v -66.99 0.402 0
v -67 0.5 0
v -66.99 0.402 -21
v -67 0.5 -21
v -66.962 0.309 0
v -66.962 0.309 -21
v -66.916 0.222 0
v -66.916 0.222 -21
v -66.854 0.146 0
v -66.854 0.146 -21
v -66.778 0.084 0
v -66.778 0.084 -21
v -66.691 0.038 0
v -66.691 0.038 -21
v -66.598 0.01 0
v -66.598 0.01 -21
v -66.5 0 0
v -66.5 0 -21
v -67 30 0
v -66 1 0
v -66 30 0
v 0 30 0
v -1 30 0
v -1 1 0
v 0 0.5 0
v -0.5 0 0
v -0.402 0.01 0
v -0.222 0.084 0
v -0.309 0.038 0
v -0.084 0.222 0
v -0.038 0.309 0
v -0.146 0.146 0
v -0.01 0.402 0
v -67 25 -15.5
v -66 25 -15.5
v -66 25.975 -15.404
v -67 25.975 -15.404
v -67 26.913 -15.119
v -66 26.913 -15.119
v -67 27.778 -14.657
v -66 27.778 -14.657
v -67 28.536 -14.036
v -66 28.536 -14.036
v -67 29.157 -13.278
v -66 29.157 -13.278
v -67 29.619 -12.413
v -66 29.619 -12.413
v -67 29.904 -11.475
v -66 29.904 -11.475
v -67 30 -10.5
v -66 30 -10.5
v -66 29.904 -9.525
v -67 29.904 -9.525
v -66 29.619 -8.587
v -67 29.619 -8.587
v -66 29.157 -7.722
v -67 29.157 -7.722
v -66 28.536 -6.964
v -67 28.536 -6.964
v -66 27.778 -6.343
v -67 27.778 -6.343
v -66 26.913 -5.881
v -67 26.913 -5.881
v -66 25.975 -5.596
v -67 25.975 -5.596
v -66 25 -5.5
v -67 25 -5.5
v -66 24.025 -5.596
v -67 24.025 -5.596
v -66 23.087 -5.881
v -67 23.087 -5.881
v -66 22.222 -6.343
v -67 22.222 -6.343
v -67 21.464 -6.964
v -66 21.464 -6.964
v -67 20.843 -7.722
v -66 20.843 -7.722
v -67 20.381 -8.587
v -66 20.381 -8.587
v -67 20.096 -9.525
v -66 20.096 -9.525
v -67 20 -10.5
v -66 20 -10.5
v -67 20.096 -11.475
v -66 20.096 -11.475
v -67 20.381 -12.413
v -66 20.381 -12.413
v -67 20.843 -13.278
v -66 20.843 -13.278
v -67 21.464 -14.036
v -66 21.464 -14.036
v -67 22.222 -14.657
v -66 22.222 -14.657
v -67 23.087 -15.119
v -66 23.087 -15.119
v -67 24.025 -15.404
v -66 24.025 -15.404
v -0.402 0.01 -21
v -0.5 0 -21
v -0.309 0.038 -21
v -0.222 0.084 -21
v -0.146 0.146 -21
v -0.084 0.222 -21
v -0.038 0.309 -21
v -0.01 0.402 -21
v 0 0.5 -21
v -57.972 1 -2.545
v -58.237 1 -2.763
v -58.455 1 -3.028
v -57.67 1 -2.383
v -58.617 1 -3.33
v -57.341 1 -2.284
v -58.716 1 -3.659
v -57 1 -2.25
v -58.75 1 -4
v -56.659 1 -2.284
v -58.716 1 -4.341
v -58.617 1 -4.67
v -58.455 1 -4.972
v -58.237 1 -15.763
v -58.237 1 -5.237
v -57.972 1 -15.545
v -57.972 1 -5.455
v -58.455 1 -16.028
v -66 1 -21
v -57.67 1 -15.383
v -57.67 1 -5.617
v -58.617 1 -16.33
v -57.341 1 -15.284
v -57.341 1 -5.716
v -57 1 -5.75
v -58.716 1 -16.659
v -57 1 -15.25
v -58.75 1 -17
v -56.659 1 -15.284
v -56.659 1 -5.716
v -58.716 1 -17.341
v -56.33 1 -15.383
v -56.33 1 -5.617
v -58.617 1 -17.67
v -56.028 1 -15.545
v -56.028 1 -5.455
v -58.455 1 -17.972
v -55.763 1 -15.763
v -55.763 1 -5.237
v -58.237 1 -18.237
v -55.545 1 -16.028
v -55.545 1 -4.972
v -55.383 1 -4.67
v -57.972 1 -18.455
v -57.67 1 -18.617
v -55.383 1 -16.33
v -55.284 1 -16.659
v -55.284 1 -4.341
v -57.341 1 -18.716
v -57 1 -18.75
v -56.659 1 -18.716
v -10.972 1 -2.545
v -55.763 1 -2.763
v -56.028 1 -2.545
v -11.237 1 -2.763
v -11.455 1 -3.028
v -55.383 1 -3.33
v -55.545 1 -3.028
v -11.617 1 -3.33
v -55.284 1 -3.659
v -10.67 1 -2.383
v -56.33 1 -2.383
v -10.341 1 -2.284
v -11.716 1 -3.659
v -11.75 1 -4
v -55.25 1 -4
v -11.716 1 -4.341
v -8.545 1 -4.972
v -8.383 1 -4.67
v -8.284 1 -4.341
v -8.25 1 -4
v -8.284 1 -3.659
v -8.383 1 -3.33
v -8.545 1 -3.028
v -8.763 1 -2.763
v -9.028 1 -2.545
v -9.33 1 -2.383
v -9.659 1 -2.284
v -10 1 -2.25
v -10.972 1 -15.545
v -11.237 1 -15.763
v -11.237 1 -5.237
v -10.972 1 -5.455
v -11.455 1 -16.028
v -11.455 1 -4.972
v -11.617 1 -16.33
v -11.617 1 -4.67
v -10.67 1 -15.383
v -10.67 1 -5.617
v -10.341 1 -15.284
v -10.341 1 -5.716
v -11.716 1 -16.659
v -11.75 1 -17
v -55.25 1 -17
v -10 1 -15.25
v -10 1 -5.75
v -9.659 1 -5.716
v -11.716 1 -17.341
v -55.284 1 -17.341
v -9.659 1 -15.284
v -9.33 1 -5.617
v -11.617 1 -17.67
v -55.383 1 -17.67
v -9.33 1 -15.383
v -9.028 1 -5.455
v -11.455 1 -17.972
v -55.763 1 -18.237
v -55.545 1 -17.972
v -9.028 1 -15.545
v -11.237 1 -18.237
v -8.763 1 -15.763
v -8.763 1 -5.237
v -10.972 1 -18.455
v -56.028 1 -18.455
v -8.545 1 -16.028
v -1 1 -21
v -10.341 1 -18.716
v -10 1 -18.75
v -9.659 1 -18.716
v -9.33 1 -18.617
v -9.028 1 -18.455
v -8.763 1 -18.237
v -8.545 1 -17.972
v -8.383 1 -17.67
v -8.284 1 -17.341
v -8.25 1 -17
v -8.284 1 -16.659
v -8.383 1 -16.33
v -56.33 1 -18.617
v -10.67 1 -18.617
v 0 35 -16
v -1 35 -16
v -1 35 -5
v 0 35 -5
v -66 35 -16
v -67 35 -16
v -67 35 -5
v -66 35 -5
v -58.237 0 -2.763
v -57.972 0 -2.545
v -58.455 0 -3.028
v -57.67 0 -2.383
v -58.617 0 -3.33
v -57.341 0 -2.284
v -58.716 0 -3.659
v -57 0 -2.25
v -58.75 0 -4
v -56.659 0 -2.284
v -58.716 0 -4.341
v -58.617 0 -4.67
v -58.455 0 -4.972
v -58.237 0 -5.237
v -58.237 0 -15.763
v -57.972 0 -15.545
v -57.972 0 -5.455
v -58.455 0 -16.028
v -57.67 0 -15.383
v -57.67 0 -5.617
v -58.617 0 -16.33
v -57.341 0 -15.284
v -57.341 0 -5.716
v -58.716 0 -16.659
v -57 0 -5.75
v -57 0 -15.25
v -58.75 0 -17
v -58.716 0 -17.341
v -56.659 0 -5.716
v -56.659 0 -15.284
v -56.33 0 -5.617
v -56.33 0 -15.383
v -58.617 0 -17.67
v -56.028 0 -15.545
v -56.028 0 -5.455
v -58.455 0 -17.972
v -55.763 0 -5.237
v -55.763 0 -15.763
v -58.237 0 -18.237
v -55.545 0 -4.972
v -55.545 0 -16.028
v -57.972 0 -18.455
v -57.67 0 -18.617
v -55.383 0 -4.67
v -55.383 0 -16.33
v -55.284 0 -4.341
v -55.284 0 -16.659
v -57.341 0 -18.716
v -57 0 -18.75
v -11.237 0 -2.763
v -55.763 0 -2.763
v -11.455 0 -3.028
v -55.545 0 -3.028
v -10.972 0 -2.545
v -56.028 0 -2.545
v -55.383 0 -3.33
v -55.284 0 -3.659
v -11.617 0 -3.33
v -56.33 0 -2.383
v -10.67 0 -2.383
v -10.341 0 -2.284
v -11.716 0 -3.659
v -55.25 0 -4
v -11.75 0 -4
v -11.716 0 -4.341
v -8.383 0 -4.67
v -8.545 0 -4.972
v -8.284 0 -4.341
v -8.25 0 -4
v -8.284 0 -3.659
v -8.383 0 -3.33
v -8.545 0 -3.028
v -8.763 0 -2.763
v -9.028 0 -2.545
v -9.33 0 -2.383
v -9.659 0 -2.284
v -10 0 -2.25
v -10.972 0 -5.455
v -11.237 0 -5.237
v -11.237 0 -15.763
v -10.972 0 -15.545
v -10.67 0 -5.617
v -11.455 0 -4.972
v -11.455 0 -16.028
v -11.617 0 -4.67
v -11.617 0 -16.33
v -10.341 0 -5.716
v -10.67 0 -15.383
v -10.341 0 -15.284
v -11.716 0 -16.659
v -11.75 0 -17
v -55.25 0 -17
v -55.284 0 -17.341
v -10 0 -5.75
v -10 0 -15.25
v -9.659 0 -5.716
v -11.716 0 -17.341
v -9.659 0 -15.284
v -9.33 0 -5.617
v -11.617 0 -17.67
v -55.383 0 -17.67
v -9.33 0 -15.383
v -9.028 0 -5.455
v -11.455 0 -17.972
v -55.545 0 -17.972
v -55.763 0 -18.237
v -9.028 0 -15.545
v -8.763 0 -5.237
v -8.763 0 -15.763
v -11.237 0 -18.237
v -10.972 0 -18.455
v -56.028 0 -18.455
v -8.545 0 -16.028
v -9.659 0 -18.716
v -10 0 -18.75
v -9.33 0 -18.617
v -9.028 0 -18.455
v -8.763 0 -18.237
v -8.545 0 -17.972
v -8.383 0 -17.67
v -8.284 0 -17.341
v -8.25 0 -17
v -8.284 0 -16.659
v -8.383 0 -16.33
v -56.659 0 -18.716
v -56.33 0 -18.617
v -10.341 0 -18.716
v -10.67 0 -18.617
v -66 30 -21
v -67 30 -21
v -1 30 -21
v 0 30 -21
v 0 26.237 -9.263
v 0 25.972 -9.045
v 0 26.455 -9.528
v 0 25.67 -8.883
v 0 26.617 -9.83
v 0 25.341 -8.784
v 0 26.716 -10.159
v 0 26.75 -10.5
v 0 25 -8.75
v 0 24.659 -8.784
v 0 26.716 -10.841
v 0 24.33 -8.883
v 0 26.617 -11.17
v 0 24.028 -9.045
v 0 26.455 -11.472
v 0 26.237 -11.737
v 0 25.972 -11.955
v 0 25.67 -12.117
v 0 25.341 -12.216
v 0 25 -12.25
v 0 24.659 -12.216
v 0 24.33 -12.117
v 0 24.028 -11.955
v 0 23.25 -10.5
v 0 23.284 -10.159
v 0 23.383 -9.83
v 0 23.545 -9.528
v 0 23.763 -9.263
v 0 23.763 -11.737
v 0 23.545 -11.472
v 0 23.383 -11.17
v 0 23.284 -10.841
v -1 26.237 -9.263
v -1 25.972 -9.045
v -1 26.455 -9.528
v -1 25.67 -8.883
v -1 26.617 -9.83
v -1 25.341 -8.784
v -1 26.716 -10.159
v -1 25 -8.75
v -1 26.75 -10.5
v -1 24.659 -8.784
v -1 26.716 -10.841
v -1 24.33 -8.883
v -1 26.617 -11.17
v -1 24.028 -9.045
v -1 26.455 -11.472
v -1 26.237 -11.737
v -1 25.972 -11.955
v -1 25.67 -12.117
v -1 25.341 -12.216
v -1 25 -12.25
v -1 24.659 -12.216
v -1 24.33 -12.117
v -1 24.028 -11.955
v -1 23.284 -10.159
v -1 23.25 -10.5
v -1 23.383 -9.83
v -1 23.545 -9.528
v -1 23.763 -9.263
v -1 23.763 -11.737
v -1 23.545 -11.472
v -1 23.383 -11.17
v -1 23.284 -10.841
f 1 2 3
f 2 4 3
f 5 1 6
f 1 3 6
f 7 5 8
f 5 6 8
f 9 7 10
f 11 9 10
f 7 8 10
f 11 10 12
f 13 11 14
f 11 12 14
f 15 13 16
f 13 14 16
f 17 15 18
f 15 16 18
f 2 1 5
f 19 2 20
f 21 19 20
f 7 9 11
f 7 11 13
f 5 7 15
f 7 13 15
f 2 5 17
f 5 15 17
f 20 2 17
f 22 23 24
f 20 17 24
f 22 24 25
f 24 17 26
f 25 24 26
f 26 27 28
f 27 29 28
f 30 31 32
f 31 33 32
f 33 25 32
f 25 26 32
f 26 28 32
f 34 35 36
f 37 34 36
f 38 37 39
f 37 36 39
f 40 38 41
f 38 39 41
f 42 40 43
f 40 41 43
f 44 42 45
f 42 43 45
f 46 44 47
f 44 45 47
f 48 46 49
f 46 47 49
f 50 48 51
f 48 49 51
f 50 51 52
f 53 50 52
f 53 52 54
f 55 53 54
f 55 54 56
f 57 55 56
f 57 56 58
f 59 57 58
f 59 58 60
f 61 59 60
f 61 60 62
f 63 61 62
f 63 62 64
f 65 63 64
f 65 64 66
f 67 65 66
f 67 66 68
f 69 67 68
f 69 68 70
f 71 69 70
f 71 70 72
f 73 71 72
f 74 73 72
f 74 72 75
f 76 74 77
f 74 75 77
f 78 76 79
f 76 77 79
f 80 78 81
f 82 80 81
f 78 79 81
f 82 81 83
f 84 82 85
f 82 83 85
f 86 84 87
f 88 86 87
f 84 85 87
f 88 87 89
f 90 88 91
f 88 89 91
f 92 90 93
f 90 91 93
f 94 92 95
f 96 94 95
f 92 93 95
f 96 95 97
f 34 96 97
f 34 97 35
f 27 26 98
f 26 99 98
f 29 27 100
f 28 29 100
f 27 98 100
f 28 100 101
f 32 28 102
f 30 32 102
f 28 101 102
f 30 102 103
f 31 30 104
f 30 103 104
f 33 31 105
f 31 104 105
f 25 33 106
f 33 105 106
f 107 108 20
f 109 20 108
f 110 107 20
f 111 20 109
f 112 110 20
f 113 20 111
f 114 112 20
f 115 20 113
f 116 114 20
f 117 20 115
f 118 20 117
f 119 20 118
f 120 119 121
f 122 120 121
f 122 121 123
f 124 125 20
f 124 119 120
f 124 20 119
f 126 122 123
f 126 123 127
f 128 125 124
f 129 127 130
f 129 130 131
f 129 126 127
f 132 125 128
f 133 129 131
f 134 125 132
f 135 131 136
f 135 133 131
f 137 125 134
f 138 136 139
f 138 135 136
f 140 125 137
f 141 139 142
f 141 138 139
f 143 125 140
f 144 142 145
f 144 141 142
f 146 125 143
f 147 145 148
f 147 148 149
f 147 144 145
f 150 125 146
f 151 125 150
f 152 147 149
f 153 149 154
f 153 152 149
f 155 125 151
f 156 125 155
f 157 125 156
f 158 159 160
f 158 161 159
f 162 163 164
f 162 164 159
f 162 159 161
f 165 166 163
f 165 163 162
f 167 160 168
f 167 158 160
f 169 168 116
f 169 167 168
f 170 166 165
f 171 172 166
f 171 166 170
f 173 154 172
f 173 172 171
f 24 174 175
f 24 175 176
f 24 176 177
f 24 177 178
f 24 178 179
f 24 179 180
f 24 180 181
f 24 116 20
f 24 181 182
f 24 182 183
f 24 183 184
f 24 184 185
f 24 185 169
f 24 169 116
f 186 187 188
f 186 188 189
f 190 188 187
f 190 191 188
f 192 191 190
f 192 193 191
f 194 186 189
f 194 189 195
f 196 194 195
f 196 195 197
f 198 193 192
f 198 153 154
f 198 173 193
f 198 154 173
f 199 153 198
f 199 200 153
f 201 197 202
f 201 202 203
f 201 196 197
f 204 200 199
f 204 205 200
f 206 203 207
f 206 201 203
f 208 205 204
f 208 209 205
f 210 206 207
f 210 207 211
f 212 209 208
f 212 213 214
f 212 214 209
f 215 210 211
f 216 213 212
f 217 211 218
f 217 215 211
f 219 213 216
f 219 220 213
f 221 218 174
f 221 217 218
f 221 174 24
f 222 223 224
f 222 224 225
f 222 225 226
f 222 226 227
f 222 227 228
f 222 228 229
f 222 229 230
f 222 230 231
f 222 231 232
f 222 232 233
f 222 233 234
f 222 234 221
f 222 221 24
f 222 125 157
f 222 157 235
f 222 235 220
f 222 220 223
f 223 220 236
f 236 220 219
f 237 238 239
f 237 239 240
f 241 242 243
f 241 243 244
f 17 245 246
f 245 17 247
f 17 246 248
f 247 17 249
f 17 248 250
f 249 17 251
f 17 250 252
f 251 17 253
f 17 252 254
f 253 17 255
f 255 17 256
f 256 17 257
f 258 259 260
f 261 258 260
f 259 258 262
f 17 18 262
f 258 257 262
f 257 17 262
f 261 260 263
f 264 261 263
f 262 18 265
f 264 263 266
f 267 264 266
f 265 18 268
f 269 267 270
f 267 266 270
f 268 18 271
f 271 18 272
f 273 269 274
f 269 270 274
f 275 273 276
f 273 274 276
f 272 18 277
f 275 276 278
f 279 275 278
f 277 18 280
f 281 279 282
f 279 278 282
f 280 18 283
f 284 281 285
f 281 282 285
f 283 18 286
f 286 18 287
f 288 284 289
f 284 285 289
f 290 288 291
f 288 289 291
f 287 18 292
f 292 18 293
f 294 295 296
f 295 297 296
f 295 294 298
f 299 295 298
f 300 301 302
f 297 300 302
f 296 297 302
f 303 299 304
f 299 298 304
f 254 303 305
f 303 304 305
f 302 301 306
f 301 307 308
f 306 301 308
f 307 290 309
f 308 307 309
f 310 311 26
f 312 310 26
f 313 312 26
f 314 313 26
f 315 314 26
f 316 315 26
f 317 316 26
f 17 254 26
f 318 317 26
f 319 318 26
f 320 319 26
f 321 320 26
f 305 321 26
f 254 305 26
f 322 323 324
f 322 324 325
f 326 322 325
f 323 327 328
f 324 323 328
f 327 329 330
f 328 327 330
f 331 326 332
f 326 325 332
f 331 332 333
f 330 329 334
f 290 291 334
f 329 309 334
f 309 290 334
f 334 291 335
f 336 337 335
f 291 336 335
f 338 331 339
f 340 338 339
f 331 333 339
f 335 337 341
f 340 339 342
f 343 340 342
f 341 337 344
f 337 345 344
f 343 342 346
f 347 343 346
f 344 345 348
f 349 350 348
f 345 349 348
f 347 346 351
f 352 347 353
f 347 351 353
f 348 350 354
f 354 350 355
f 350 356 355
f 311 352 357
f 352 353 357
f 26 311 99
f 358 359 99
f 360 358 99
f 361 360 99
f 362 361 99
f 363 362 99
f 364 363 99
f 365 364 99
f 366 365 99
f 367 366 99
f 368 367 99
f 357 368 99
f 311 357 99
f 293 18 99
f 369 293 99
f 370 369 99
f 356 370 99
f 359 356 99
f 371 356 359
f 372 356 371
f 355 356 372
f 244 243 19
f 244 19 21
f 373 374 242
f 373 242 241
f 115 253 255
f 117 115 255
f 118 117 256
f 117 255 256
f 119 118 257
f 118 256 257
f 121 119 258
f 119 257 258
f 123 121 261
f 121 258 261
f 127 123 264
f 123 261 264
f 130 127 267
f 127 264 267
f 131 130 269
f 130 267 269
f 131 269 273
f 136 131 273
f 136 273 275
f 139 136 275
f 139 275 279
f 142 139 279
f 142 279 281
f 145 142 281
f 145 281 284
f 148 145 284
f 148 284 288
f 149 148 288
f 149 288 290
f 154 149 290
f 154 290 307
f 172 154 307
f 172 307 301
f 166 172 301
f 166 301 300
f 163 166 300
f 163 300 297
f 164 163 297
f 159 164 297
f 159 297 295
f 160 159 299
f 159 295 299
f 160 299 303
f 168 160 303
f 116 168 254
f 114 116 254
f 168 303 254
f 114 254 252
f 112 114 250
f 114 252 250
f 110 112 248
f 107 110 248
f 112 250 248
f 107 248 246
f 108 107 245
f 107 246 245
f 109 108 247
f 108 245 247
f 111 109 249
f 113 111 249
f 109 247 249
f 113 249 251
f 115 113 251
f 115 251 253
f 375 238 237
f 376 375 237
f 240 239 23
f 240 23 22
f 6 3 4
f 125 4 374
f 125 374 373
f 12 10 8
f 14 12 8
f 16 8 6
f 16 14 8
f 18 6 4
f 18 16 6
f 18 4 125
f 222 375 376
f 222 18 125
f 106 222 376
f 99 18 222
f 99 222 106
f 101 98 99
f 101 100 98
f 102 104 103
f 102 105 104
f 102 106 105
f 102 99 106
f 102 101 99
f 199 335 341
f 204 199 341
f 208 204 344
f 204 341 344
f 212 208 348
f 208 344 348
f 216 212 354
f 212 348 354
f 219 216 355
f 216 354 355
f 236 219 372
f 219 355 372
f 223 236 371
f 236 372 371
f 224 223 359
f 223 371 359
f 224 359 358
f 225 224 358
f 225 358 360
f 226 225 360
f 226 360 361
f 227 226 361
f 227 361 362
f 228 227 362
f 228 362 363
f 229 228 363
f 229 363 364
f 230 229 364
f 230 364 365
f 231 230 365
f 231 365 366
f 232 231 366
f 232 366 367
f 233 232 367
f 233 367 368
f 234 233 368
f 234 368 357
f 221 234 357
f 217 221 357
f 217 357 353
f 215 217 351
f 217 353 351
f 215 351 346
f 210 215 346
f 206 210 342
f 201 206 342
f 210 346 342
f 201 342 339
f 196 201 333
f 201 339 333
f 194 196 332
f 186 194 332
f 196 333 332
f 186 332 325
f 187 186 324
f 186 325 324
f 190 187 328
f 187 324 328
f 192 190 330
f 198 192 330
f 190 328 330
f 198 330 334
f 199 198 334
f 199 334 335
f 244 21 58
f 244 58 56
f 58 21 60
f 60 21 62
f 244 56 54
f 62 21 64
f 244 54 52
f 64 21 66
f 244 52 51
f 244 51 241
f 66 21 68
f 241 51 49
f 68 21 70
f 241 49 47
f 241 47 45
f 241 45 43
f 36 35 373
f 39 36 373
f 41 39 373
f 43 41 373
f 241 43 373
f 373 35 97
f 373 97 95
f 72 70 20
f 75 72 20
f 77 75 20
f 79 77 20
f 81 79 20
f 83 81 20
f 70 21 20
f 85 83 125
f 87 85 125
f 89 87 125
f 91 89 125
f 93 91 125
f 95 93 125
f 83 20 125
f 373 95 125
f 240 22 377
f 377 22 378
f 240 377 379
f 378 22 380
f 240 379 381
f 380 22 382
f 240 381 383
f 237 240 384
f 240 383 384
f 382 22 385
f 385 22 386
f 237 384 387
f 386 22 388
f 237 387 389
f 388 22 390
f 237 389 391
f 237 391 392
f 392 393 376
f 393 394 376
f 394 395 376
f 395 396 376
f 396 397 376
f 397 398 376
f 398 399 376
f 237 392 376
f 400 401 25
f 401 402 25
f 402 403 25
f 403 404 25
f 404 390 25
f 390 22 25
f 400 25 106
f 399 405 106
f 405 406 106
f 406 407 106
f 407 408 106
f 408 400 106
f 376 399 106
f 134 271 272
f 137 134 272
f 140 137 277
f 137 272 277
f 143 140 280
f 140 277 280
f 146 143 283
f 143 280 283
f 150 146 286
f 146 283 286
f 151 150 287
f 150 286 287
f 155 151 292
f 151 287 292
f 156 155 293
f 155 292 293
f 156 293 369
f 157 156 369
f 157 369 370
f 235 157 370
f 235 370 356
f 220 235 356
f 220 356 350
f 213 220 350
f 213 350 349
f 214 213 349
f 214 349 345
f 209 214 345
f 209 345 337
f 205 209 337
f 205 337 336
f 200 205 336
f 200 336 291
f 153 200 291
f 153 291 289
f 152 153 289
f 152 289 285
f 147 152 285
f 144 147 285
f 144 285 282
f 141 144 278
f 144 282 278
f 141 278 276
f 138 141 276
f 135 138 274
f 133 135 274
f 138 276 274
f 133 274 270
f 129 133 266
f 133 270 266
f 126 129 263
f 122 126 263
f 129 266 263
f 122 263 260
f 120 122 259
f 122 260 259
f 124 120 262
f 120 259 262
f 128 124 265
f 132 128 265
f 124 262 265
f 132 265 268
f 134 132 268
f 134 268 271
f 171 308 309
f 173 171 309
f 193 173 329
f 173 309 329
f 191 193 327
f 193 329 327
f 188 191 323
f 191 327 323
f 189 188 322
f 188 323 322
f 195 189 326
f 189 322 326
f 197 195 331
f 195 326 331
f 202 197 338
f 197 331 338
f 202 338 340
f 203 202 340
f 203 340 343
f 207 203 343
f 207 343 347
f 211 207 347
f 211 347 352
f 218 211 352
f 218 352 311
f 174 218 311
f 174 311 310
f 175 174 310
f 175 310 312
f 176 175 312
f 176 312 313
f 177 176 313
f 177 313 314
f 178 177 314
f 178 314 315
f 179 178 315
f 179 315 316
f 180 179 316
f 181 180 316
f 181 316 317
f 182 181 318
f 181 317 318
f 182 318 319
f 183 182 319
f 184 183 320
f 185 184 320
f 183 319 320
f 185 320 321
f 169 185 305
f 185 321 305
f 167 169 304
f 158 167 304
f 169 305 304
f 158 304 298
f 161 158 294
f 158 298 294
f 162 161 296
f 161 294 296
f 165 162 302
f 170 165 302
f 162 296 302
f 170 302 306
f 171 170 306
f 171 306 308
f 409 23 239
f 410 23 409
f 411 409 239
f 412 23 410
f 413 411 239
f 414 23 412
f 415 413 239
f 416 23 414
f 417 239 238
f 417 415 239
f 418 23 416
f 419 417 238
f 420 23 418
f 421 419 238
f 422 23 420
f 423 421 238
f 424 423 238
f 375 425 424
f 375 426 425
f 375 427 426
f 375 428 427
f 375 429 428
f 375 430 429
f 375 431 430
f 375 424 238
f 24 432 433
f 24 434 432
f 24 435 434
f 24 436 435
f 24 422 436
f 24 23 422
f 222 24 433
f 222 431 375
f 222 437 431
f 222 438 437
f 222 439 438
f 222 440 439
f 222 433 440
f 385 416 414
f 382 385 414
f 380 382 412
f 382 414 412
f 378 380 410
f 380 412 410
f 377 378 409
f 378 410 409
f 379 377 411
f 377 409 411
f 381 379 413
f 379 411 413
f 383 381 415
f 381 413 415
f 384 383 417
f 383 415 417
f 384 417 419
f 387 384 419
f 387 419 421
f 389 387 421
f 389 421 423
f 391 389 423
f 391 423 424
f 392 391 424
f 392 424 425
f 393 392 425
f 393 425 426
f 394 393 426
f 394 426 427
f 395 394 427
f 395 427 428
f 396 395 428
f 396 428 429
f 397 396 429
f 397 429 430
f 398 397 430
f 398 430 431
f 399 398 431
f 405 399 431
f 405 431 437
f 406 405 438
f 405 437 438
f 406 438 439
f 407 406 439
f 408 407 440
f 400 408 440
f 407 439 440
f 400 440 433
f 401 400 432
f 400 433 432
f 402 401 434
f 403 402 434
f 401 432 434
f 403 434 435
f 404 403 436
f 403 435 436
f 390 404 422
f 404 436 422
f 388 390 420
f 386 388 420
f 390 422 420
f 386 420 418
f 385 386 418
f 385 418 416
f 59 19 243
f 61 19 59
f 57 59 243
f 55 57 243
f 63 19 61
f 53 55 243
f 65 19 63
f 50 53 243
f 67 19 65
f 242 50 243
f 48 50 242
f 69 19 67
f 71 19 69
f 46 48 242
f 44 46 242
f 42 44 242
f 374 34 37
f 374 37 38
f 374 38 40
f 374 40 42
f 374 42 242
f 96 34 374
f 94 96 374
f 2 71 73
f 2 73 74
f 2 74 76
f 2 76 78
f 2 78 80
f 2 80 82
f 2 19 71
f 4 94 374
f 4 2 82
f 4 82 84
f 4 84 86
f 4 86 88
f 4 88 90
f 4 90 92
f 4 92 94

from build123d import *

# Parameters (mm, degrees)
SKETCH_1_W                  = 67
SKETCH_1_H                  = 21
EXTRUDE_1_DEPTH             = 35
SHELL_1_T                   = -1
FILLET_2_R                  = 0.5
CHAMFER_1_SIZE              = 5
HOLE_WIZARD_3_5_3_5_1_D     = 3.5
HOLE_WIZARD_10_0_10_1_D     = 10
HOLE_WIZARD_10_0_10_1_DEPTH = 1
HOLE_WIZARD_3_5_3_5_2_D     = 3.5


with BuildPart() as part:
    # 草图1 → 凸台-拉伸1 (new body)
    with BuildSketch(Plane(origin=(0, 0, 0), x_dir=(1, 0, 0), z_dir=(0, 1, 0))):
        with Locations((-33.5, 10.5)):
            Rectangle(SKETCH_1_W, SKETCH_1_H)
    extrude(amount=EXTRUDE_1_DEPTH)

    # 抽壳1
    shell_1_openings = [part.faces().sort_by_distance(p)[0] for p in [
        (-33.5, 35, -10.5),
        (-33.5, 17.5, 0),
        (-33.5, 17.5, -21),
    ]]
    offset(amount=SHELL_1_T, openings=shell_1_openings, kind=Kind.INTERSECTION)

    # 圆角2
    fillet_2_edges = [part.edges().sort_by_distance(p)[0] for p in [
        (-67, 0, -10.5),
        (0, 0, -10.5),
    ]]
    fillet(fillet_2_edges, radius=FILLET_2_R)

    # 倒角1
    chamfer_1_edges = [part.edges().sort_by_distance(p)[0] for p in [
        (-66.5, 35, 0),
        (-66.5, 35, -21),
        (-0.5, 35, 0),
        (-0.5, 35, -21),
    ]]
    chamfer(chamfer_1_edges, length=CHAMFER_1_SIZE)

    # Ø3.5 (3.5) 直径槽口1 (through all)
    with Locations(Plane(origin=(0, 1, 0), x_dir=(1, 0, 0), z_dir=(0, 1, 0))):
        with Locations((-57, 17), (-10, 17), (-10, 4), (-57, 4)):
            Hole(HOLE_WIZARD_3_5_3_5_1_D / 2)

    # Ø10.0 (10) 直径槽口1
    with Locations(Plane.ZY.offset(67)):
        with Locations((-10.5, 25)):
            Hole(HOLE_WIZARD_10_0_10_1_D / 2, depth=HOLE_WIZARD_10_0_10_1_DEPTH)

    # Ø3.5 (3.5) 直径槽口2 (through all)
    with Locations(Plane(origin=(0, 0, 0), x_dir=(0, 0, -1), z_dir=(1, 0, 0))):
        with Locations((10.5, 25)):
            Hole(HOLE_WIZARD_3_5_3_5_2_D / 2)


solid = part.part
